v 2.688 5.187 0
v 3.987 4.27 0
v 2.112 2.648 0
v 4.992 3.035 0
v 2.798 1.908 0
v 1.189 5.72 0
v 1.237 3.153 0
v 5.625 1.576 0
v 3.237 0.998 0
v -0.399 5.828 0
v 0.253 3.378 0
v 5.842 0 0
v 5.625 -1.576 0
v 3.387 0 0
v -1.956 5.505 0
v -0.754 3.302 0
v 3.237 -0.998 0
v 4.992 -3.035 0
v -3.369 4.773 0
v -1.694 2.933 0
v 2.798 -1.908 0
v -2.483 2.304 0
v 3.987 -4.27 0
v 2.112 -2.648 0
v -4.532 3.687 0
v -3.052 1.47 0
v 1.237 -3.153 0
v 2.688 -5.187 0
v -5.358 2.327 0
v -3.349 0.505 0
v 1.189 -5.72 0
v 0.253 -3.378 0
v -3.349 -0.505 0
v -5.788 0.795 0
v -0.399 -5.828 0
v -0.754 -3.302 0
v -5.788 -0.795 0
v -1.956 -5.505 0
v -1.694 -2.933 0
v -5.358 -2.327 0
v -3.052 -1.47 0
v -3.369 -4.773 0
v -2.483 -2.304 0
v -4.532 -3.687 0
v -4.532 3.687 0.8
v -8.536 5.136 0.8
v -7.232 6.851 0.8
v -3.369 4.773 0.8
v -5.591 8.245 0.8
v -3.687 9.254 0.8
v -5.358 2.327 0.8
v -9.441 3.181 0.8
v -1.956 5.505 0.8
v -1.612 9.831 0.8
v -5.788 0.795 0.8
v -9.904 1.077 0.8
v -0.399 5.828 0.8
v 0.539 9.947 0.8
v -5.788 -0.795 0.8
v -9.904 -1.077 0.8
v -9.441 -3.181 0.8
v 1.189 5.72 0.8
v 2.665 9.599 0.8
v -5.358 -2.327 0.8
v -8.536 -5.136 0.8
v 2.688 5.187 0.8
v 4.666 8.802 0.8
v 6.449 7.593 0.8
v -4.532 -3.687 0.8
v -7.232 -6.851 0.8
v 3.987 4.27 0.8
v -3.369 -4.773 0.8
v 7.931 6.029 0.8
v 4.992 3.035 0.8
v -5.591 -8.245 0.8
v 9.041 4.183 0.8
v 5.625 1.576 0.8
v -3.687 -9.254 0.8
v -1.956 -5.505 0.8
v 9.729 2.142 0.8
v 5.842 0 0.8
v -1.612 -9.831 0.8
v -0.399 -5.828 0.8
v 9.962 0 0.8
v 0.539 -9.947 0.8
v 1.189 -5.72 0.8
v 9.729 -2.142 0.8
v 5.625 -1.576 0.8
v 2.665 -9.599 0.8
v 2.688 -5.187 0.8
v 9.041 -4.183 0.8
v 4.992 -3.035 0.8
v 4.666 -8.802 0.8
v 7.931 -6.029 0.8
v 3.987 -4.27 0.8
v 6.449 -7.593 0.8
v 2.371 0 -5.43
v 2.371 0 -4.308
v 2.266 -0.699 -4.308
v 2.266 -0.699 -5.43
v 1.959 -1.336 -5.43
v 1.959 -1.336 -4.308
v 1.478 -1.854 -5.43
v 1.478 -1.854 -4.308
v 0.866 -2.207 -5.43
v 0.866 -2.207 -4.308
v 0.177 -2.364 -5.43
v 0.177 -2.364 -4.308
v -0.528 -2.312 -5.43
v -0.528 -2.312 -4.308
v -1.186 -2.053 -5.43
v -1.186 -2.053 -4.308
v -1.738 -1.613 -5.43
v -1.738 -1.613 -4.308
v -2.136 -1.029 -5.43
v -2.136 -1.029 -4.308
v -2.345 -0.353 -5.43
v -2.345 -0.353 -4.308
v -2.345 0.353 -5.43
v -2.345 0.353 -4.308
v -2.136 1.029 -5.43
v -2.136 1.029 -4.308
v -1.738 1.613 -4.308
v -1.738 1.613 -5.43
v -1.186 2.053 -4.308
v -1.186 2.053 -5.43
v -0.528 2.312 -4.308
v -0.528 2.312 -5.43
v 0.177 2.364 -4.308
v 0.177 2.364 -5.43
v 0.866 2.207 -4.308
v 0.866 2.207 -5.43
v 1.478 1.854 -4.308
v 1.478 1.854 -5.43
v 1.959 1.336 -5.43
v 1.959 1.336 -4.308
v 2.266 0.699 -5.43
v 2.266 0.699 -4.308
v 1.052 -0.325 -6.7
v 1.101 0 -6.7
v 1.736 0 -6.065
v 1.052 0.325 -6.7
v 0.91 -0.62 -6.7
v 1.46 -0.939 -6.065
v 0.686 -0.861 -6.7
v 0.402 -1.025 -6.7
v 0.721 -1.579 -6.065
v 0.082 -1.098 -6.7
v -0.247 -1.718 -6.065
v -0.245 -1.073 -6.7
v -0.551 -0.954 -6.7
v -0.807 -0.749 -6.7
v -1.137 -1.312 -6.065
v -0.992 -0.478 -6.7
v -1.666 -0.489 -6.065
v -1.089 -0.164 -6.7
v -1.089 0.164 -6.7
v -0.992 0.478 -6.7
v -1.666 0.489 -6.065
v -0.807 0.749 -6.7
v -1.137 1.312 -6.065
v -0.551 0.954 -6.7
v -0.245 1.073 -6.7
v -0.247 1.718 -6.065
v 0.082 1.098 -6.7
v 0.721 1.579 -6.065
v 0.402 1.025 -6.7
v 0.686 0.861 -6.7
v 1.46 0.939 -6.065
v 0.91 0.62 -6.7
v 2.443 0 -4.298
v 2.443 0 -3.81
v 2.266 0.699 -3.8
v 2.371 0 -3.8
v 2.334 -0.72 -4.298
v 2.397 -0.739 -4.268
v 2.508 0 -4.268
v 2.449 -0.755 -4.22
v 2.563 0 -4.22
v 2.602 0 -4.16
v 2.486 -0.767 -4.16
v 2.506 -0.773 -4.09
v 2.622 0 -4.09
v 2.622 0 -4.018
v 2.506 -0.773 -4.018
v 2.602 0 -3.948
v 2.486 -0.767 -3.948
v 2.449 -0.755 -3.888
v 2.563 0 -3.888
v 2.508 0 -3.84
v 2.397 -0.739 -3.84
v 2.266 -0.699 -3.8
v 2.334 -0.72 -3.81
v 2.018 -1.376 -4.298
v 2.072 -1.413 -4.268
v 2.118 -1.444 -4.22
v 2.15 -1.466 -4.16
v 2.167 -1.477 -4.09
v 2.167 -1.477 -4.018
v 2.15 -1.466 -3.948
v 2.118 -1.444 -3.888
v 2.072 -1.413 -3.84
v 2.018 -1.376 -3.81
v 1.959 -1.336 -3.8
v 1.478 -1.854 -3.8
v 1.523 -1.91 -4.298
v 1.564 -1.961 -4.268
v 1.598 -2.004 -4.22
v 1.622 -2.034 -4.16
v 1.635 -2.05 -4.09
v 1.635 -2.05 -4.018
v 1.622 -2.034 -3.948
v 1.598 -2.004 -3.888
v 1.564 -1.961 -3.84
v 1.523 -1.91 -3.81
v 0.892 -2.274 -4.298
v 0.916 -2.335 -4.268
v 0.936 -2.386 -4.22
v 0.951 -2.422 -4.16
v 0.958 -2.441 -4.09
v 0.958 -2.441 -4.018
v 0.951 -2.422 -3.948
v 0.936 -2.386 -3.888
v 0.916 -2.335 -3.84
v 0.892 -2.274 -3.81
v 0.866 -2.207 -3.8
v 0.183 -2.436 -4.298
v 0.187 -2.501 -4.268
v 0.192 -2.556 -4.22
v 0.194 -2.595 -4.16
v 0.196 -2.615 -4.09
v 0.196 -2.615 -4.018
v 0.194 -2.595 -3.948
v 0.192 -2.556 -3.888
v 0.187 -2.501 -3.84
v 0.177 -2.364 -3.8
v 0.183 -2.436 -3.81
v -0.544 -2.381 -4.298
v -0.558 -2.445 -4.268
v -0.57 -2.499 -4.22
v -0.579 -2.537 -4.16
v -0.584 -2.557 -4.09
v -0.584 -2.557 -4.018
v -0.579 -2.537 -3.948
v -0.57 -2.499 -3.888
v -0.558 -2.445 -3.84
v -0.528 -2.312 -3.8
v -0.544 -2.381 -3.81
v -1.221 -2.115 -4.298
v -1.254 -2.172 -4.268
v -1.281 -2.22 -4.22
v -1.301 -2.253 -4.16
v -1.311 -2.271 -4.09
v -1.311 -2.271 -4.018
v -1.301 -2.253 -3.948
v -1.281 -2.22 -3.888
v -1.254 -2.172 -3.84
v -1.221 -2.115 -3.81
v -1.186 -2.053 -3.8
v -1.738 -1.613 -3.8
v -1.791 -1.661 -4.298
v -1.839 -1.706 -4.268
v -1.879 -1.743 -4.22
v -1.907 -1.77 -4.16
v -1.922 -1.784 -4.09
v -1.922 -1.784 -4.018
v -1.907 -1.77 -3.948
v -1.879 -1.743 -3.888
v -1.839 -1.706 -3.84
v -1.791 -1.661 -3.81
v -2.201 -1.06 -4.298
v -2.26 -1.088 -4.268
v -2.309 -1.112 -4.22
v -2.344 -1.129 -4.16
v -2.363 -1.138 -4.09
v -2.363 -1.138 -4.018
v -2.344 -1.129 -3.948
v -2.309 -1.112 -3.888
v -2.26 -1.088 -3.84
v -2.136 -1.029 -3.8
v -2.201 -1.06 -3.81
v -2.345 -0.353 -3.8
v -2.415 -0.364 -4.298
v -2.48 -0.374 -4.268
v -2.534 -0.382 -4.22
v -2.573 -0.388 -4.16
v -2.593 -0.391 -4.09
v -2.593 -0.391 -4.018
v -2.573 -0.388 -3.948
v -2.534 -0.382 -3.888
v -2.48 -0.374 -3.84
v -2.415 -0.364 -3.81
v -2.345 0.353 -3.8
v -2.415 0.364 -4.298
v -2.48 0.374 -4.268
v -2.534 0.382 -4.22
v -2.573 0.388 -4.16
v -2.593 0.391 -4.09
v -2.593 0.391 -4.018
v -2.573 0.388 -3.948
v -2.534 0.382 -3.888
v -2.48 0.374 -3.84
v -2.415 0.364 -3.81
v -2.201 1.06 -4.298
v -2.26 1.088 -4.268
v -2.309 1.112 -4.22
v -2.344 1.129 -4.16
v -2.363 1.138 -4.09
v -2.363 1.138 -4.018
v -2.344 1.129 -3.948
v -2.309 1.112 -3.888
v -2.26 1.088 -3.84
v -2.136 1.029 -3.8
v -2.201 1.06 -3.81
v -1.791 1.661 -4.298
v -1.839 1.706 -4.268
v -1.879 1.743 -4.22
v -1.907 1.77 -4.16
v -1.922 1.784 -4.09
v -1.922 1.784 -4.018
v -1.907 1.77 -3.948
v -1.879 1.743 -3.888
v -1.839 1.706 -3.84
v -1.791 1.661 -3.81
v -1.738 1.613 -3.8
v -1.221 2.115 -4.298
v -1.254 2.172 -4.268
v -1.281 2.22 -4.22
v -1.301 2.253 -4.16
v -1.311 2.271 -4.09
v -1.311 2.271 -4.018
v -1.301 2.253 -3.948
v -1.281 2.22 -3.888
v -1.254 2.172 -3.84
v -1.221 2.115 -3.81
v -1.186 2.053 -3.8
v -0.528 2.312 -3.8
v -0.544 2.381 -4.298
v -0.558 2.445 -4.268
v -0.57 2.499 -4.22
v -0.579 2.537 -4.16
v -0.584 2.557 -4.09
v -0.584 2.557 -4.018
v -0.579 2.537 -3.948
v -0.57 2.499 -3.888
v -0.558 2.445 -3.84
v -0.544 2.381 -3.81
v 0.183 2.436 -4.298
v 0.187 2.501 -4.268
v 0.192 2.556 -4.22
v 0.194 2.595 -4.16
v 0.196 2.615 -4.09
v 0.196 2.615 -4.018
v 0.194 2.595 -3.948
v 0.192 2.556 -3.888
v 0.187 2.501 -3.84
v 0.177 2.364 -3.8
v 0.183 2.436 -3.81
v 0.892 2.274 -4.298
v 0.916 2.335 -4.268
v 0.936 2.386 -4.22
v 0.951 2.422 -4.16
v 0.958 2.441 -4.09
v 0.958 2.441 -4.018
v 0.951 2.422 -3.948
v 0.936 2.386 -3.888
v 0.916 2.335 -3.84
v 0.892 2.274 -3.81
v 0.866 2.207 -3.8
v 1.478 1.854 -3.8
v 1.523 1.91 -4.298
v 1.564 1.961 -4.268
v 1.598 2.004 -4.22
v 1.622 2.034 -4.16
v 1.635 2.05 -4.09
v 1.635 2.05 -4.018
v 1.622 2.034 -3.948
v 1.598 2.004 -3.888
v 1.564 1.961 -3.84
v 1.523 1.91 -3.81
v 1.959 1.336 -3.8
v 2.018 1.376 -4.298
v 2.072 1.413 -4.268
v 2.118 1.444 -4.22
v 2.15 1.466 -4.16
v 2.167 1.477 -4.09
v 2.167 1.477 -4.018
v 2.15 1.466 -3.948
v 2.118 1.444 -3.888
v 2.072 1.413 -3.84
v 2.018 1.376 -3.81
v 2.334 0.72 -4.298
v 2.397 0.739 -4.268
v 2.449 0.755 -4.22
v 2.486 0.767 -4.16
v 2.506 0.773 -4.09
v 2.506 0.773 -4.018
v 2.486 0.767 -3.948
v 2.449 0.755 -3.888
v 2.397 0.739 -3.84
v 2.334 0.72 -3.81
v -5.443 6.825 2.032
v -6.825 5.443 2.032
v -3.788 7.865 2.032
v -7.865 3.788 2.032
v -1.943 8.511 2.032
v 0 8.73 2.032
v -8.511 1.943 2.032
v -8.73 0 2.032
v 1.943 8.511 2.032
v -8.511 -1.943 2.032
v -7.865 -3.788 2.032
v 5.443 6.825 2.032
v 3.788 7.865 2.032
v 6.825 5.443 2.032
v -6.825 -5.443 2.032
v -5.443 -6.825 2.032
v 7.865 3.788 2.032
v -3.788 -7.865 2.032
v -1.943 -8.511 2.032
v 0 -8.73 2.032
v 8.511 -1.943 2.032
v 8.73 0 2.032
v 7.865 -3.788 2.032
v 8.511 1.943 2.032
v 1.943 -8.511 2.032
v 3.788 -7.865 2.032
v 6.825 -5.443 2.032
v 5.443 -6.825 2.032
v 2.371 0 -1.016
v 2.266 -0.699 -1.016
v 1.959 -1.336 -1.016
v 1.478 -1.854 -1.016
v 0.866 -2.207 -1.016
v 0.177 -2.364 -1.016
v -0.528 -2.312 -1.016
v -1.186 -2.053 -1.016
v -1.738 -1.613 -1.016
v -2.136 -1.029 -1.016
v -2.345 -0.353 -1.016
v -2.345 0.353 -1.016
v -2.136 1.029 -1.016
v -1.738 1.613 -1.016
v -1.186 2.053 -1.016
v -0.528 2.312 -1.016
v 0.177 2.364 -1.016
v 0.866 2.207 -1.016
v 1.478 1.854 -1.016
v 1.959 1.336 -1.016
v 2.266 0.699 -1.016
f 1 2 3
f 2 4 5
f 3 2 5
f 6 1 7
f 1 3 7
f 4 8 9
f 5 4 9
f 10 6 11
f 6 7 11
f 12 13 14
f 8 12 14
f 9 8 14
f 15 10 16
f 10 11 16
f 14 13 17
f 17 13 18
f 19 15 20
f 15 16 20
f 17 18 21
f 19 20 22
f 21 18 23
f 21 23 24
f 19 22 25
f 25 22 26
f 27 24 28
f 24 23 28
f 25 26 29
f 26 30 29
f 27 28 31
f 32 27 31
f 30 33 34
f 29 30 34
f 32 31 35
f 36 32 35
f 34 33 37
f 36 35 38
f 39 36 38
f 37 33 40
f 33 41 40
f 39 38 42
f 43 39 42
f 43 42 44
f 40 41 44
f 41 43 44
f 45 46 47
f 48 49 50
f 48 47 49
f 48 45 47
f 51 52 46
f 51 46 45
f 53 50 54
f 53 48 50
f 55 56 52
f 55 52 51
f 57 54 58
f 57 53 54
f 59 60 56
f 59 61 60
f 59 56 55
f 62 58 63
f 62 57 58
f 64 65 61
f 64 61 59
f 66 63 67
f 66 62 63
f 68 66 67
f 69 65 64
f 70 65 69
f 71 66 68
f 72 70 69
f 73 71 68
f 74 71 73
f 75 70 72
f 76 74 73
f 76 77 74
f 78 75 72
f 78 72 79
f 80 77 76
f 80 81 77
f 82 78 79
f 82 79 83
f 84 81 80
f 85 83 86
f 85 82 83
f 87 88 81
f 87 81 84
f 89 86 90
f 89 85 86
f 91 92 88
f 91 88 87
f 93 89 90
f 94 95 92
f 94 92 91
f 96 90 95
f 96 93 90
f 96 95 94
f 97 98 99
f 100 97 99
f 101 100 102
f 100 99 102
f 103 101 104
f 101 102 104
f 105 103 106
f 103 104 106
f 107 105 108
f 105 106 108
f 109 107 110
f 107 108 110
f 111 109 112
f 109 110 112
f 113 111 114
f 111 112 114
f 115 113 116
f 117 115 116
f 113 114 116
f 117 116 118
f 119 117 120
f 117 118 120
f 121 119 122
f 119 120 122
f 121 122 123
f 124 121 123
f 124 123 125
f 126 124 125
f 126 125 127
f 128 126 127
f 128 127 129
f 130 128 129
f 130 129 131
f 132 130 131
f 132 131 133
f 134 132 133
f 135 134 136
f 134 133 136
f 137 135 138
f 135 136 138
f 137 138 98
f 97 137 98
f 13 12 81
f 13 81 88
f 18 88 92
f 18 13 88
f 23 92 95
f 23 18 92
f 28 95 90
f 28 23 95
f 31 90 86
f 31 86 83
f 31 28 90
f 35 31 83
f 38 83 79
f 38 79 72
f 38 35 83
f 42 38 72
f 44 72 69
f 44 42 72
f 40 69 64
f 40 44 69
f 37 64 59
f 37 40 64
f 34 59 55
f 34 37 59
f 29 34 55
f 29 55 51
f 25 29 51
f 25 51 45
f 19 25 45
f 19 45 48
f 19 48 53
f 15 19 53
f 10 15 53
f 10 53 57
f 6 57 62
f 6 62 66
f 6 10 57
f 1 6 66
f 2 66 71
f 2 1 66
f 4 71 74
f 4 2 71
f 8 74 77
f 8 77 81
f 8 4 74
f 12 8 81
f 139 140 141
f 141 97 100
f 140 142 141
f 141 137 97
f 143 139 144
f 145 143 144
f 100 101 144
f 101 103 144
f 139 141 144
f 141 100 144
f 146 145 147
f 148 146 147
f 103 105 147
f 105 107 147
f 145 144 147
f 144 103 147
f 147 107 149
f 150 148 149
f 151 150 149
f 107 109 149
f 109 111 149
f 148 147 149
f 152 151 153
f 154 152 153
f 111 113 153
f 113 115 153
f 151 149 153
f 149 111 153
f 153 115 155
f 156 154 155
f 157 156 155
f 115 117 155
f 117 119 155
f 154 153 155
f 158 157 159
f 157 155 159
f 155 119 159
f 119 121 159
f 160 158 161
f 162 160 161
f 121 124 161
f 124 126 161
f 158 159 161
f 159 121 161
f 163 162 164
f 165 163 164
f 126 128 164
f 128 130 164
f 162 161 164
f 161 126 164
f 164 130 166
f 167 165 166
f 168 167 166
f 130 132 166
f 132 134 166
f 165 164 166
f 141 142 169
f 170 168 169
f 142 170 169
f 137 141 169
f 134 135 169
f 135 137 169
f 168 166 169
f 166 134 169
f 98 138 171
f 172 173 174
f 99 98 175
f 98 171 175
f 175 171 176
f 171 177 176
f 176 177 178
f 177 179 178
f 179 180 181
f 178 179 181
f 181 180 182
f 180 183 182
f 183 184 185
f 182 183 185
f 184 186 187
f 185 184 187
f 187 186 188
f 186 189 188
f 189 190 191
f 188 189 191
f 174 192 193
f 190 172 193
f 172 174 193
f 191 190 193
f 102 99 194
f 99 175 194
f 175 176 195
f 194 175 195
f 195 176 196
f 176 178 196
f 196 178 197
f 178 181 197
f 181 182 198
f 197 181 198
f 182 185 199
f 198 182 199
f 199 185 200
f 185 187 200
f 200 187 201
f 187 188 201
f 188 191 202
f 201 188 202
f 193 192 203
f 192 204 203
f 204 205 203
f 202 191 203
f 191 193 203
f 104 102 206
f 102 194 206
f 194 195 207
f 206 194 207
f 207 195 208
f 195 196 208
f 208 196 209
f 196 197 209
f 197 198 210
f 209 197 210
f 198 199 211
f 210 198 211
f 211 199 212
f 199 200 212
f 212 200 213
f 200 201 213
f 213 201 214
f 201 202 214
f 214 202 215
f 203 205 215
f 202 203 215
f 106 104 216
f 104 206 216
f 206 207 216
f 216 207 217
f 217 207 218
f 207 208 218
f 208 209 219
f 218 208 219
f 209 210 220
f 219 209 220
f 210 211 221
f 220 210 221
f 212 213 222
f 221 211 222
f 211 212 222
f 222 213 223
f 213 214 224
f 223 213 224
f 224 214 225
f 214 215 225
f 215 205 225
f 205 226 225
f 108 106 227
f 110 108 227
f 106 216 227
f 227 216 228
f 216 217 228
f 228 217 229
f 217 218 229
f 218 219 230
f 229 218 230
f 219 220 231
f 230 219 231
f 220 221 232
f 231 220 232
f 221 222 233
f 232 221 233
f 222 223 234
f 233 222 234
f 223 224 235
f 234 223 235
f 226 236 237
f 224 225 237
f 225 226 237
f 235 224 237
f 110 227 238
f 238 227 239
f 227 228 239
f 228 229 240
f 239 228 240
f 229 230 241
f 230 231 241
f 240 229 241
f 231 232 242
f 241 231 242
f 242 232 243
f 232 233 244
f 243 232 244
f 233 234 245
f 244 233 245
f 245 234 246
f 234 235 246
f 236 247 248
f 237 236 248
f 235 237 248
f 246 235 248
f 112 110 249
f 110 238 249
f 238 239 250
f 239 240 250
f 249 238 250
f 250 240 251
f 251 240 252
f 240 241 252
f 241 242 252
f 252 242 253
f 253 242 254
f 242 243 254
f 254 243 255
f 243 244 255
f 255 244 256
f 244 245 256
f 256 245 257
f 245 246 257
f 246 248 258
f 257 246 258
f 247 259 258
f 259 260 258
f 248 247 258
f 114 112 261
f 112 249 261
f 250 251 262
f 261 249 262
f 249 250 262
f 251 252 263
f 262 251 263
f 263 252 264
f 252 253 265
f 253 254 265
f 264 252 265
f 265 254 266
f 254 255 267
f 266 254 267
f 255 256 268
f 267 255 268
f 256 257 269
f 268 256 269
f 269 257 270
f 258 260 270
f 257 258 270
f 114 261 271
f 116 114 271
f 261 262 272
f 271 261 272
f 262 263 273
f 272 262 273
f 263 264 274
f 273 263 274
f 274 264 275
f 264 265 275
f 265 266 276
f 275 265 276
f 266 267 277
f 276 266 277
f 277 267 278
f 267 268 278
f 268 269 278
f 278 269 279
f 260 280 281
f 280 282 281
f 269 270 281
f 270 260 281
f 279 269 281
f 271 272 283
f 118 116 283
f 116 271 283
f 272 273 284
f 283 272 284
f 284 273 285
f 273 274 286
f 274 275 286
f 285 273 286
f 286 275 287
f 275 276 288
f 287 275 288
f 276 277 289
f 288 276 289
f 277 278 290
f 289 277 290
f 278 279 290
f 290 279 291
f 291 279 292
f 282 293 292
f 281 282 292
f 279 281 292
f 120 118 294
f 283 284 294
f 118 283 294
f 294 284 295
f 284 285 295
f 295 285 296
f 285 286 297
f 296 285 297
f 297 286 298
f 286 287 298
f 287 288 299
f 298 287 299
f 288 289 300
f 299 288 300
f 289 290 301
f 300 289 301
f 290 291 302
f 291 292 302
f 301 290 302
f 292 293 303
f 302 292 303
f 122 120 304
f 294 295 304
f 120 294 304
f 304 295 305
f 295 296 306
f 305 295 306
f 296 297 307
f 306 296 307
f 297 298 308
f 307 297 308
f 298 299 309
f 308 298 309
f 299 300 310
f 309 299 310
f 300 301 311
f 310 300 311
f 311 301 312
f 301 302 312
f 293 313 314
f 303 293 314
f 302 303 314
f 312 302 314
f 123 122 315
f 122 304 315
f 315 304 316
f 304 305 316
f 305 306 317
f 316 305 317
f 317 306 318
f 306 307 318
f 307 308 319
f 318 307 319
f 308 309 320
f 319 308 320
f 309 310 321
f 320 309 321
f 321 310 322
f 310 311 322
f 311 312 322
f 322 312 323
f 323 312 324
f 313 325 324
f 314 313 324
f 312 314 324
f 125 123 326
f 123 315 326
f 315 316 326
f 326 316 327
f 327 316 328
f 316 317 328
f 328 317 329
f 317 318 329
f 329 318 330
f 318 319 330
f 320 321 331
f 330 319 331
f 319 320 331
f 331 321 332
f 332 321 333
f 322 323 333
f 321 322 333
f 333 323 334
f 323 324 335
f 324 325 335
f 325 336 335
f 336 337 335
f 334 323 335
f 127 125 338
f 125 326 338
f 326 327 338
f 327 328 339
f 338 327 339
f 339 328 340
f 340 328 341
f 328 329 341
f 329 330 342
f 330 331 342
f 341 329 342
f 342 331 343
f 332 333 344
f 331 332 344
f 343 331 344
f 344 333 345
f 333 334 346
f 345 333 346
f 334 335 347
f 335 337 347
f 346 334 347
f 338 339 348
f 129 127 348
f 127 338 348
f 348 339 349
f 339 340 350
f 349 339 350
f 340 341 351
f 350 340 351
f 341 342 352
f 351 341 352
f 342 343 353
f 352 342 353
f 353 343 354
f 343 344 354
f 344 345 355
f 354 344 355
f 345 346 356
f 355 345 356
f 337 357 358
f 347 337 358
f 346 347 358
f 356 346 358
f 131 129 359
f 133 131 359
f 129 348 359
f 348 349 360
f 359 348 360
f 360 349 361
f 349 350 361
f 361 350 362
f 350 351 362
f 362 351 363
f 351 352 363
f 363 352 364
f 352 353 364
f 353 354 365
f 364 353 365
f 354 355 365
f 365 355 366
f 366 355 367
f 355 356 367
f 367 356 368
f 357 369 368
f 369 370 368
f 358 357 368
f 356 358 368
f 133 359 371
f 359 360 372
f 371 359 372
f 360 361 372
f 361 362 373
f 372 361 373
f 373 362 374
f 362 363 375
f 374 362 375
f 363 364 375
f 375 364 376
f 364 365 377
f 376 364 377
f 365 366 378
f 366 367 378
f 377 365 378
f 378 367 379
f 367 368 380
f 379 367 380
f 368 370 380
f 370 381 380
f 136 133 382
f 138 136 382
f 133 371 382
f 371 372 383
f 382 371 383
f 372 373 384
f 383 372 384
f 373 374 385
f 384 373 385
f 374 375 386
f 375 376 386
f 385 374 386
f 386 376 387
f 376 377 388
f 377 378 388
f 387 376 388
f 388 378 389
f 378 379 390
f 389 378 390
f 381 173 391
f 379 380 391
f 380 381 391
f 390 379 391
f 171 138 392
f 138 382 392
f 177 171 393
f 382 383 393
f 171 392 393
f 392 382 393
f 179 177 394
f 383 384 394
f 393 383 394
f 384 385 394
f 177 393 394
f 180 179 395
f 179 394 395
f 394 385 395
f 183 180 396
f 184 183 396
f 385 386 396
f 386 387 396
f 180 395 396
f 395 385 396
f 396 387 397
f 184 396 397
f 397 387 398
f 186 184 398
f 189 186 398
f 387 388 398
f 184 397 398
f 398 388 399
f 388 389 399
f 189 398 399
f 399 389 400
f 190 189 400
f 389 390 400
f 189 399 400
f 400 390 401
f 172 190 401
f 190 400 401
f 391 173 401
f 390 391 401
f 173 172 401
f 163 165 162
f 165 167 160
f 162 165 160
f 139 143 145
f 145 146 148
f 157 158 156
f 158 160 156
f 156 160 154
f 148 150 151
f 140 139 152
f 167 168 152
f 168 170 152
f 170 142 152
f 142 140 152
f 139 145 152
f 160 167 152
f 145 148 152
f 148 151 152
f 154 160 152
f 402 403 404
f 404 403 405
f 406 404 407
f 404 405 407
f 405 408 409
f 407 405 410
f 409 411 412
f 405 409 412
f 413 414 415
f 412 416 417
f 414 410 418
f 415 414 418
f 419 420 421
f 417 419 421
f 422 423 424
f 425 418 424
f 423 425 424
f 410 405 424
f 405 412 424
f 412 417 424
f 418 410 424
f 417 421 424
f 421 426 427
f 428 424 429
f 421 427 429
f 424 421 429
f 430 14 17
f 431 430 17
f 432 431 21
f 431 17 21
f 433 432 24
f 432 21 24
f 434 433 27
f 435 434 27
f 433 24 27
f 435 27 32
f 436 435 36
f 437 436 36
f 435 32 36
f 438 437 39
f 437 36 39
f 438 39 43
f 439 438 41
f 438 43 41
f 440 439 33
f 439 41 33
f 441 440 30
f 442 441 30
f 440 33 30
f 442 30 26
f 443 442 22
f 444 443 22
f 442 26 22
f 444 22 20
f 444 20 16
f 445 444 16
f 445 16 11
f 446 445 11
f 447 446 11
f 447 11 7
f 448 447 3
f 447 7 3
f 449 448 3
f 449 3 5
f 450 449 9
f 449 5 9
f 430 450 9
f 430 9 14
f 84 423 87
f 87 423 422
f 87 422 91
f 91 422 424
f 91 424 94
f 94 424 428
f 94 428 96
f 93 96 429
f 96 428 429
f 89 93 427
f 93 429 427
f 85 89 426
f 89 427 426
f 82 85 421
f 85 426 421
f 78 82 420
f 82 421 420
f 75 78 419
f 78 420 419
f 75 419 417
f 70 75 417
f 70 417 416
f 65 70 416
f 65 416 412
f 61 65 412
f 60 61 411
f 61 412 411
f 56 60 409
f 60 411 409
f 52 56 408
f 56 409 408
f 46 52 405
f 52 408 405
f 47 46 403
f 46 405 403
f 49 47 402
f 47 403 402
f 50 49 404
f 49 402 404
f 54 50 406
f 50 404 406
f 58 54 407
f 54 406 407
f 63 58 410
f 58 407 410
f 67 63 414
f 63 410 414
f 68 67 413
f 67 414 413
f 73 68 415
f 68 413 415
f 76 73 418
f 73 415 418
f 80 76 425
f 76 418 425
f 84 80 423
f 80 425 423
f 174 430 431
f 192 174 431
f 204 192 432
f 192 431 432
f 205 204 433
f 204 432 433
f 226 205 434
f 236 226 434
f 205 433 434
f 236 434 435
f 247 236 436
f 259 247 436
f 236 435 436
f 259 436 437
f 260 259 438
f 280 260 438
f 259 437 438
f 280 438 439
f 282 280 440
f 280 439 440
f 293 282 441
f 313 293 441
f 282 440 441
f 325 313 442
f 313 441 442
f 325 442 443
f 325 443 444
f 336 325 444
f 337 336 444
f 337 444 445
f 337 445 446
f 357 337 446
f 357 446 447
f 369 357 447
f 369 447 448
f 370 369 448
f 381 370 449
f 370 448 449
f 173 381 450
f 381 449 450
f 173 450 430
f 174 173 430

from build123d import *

# Parameters (mm, degrees)
F2_SIZE  = 1.27
F3_R     = 14.2800405429
F3_R_2   = 10
F3_R_3   = 5.842
F4_DEPTH = 0.8
F5_SIZE  = 1.016


# Not quite as in the source:
# - a fillet or chamfer that OpenCascade refuses, or shapes differently, is made with other operations: its cross-section is extruded or revolved along the edge and cut away or added


with BuildPart() as f1:
    # F0 (on Front) → F1 (revolve)
    with BuildSketch(Plane.XZ):
        with BuildLine():
            Line((2.6757909362, 0), (4.2185683136, 0))
            Line((4.2185683136, 0), (10, 0))
            Line((10, 0), (10, 2.032))
            Line((10, 2.032), (0, 2.032))
            Line((0, 2.032), (0, 0))
            Line((0, 0), (0, -6.7))
            Line((0, -6.7), (2.3710267587, -6.7))
            Line((2.3710267587, -6.7), (2.3710267587, -4.308))
            ThreePointArc((2.3710267587, -4.308), (2.6250267587, -4.054), (2.3710267587, -3.8))
            Line((2.3710267587, -3.8), (2.3710267587, 0))
            Line((2.3710267587, 0), (2.6757909362, 0))
        make_face()
    revolve(axis=Axis((0, 0, 1.016), (0, 0, -1)))

    # F2
    f2_edges = [f1.edges().sort_by_distance(p)[0] for p in [
        (-2.371027, 0, -6.7),
    ]]
    chamfer(f2_edges, length=F2_SIZE)

    # F3 (on face) → F4 (cut)
    with BuildSketch(Plane(origin=(0, 0, 0), x_dir=(1, 0, 0), z_dir=(0, 0, -1))):
        Circle(F3_R)
        Circle(F3_R_2, mode=Mode.SUBTRACT)
        Circle(F3_R_2)
        Circle(F3_R_3, mode=Mode.SUBTRACT)
    extrude(amount=-F4_DEPTH, mode=Mode.SUBTRACT)

    # F5
    f5_edges = [f1.edges().sort_by_distance(p)[0] for p in [
        (-2.371027, 0, 0),
    ]]
    chamfer(f5_edges, length=F5_SIZE)

    # F6: chamfer of 1.27 on 1 edges, made by hand

    # F6_s1 → F6_t2 (revolve, cut)
    with BuildSketch(Plane.XZ):
        Polygon((10, 0.762), (8.73, 2.032), (10, 2.032), align=None)
    revolve(axis=Axis((0, 0, 2.032), (0, 0, -1)), mode=Mode.SUBTRACT)


solid = f1.part
